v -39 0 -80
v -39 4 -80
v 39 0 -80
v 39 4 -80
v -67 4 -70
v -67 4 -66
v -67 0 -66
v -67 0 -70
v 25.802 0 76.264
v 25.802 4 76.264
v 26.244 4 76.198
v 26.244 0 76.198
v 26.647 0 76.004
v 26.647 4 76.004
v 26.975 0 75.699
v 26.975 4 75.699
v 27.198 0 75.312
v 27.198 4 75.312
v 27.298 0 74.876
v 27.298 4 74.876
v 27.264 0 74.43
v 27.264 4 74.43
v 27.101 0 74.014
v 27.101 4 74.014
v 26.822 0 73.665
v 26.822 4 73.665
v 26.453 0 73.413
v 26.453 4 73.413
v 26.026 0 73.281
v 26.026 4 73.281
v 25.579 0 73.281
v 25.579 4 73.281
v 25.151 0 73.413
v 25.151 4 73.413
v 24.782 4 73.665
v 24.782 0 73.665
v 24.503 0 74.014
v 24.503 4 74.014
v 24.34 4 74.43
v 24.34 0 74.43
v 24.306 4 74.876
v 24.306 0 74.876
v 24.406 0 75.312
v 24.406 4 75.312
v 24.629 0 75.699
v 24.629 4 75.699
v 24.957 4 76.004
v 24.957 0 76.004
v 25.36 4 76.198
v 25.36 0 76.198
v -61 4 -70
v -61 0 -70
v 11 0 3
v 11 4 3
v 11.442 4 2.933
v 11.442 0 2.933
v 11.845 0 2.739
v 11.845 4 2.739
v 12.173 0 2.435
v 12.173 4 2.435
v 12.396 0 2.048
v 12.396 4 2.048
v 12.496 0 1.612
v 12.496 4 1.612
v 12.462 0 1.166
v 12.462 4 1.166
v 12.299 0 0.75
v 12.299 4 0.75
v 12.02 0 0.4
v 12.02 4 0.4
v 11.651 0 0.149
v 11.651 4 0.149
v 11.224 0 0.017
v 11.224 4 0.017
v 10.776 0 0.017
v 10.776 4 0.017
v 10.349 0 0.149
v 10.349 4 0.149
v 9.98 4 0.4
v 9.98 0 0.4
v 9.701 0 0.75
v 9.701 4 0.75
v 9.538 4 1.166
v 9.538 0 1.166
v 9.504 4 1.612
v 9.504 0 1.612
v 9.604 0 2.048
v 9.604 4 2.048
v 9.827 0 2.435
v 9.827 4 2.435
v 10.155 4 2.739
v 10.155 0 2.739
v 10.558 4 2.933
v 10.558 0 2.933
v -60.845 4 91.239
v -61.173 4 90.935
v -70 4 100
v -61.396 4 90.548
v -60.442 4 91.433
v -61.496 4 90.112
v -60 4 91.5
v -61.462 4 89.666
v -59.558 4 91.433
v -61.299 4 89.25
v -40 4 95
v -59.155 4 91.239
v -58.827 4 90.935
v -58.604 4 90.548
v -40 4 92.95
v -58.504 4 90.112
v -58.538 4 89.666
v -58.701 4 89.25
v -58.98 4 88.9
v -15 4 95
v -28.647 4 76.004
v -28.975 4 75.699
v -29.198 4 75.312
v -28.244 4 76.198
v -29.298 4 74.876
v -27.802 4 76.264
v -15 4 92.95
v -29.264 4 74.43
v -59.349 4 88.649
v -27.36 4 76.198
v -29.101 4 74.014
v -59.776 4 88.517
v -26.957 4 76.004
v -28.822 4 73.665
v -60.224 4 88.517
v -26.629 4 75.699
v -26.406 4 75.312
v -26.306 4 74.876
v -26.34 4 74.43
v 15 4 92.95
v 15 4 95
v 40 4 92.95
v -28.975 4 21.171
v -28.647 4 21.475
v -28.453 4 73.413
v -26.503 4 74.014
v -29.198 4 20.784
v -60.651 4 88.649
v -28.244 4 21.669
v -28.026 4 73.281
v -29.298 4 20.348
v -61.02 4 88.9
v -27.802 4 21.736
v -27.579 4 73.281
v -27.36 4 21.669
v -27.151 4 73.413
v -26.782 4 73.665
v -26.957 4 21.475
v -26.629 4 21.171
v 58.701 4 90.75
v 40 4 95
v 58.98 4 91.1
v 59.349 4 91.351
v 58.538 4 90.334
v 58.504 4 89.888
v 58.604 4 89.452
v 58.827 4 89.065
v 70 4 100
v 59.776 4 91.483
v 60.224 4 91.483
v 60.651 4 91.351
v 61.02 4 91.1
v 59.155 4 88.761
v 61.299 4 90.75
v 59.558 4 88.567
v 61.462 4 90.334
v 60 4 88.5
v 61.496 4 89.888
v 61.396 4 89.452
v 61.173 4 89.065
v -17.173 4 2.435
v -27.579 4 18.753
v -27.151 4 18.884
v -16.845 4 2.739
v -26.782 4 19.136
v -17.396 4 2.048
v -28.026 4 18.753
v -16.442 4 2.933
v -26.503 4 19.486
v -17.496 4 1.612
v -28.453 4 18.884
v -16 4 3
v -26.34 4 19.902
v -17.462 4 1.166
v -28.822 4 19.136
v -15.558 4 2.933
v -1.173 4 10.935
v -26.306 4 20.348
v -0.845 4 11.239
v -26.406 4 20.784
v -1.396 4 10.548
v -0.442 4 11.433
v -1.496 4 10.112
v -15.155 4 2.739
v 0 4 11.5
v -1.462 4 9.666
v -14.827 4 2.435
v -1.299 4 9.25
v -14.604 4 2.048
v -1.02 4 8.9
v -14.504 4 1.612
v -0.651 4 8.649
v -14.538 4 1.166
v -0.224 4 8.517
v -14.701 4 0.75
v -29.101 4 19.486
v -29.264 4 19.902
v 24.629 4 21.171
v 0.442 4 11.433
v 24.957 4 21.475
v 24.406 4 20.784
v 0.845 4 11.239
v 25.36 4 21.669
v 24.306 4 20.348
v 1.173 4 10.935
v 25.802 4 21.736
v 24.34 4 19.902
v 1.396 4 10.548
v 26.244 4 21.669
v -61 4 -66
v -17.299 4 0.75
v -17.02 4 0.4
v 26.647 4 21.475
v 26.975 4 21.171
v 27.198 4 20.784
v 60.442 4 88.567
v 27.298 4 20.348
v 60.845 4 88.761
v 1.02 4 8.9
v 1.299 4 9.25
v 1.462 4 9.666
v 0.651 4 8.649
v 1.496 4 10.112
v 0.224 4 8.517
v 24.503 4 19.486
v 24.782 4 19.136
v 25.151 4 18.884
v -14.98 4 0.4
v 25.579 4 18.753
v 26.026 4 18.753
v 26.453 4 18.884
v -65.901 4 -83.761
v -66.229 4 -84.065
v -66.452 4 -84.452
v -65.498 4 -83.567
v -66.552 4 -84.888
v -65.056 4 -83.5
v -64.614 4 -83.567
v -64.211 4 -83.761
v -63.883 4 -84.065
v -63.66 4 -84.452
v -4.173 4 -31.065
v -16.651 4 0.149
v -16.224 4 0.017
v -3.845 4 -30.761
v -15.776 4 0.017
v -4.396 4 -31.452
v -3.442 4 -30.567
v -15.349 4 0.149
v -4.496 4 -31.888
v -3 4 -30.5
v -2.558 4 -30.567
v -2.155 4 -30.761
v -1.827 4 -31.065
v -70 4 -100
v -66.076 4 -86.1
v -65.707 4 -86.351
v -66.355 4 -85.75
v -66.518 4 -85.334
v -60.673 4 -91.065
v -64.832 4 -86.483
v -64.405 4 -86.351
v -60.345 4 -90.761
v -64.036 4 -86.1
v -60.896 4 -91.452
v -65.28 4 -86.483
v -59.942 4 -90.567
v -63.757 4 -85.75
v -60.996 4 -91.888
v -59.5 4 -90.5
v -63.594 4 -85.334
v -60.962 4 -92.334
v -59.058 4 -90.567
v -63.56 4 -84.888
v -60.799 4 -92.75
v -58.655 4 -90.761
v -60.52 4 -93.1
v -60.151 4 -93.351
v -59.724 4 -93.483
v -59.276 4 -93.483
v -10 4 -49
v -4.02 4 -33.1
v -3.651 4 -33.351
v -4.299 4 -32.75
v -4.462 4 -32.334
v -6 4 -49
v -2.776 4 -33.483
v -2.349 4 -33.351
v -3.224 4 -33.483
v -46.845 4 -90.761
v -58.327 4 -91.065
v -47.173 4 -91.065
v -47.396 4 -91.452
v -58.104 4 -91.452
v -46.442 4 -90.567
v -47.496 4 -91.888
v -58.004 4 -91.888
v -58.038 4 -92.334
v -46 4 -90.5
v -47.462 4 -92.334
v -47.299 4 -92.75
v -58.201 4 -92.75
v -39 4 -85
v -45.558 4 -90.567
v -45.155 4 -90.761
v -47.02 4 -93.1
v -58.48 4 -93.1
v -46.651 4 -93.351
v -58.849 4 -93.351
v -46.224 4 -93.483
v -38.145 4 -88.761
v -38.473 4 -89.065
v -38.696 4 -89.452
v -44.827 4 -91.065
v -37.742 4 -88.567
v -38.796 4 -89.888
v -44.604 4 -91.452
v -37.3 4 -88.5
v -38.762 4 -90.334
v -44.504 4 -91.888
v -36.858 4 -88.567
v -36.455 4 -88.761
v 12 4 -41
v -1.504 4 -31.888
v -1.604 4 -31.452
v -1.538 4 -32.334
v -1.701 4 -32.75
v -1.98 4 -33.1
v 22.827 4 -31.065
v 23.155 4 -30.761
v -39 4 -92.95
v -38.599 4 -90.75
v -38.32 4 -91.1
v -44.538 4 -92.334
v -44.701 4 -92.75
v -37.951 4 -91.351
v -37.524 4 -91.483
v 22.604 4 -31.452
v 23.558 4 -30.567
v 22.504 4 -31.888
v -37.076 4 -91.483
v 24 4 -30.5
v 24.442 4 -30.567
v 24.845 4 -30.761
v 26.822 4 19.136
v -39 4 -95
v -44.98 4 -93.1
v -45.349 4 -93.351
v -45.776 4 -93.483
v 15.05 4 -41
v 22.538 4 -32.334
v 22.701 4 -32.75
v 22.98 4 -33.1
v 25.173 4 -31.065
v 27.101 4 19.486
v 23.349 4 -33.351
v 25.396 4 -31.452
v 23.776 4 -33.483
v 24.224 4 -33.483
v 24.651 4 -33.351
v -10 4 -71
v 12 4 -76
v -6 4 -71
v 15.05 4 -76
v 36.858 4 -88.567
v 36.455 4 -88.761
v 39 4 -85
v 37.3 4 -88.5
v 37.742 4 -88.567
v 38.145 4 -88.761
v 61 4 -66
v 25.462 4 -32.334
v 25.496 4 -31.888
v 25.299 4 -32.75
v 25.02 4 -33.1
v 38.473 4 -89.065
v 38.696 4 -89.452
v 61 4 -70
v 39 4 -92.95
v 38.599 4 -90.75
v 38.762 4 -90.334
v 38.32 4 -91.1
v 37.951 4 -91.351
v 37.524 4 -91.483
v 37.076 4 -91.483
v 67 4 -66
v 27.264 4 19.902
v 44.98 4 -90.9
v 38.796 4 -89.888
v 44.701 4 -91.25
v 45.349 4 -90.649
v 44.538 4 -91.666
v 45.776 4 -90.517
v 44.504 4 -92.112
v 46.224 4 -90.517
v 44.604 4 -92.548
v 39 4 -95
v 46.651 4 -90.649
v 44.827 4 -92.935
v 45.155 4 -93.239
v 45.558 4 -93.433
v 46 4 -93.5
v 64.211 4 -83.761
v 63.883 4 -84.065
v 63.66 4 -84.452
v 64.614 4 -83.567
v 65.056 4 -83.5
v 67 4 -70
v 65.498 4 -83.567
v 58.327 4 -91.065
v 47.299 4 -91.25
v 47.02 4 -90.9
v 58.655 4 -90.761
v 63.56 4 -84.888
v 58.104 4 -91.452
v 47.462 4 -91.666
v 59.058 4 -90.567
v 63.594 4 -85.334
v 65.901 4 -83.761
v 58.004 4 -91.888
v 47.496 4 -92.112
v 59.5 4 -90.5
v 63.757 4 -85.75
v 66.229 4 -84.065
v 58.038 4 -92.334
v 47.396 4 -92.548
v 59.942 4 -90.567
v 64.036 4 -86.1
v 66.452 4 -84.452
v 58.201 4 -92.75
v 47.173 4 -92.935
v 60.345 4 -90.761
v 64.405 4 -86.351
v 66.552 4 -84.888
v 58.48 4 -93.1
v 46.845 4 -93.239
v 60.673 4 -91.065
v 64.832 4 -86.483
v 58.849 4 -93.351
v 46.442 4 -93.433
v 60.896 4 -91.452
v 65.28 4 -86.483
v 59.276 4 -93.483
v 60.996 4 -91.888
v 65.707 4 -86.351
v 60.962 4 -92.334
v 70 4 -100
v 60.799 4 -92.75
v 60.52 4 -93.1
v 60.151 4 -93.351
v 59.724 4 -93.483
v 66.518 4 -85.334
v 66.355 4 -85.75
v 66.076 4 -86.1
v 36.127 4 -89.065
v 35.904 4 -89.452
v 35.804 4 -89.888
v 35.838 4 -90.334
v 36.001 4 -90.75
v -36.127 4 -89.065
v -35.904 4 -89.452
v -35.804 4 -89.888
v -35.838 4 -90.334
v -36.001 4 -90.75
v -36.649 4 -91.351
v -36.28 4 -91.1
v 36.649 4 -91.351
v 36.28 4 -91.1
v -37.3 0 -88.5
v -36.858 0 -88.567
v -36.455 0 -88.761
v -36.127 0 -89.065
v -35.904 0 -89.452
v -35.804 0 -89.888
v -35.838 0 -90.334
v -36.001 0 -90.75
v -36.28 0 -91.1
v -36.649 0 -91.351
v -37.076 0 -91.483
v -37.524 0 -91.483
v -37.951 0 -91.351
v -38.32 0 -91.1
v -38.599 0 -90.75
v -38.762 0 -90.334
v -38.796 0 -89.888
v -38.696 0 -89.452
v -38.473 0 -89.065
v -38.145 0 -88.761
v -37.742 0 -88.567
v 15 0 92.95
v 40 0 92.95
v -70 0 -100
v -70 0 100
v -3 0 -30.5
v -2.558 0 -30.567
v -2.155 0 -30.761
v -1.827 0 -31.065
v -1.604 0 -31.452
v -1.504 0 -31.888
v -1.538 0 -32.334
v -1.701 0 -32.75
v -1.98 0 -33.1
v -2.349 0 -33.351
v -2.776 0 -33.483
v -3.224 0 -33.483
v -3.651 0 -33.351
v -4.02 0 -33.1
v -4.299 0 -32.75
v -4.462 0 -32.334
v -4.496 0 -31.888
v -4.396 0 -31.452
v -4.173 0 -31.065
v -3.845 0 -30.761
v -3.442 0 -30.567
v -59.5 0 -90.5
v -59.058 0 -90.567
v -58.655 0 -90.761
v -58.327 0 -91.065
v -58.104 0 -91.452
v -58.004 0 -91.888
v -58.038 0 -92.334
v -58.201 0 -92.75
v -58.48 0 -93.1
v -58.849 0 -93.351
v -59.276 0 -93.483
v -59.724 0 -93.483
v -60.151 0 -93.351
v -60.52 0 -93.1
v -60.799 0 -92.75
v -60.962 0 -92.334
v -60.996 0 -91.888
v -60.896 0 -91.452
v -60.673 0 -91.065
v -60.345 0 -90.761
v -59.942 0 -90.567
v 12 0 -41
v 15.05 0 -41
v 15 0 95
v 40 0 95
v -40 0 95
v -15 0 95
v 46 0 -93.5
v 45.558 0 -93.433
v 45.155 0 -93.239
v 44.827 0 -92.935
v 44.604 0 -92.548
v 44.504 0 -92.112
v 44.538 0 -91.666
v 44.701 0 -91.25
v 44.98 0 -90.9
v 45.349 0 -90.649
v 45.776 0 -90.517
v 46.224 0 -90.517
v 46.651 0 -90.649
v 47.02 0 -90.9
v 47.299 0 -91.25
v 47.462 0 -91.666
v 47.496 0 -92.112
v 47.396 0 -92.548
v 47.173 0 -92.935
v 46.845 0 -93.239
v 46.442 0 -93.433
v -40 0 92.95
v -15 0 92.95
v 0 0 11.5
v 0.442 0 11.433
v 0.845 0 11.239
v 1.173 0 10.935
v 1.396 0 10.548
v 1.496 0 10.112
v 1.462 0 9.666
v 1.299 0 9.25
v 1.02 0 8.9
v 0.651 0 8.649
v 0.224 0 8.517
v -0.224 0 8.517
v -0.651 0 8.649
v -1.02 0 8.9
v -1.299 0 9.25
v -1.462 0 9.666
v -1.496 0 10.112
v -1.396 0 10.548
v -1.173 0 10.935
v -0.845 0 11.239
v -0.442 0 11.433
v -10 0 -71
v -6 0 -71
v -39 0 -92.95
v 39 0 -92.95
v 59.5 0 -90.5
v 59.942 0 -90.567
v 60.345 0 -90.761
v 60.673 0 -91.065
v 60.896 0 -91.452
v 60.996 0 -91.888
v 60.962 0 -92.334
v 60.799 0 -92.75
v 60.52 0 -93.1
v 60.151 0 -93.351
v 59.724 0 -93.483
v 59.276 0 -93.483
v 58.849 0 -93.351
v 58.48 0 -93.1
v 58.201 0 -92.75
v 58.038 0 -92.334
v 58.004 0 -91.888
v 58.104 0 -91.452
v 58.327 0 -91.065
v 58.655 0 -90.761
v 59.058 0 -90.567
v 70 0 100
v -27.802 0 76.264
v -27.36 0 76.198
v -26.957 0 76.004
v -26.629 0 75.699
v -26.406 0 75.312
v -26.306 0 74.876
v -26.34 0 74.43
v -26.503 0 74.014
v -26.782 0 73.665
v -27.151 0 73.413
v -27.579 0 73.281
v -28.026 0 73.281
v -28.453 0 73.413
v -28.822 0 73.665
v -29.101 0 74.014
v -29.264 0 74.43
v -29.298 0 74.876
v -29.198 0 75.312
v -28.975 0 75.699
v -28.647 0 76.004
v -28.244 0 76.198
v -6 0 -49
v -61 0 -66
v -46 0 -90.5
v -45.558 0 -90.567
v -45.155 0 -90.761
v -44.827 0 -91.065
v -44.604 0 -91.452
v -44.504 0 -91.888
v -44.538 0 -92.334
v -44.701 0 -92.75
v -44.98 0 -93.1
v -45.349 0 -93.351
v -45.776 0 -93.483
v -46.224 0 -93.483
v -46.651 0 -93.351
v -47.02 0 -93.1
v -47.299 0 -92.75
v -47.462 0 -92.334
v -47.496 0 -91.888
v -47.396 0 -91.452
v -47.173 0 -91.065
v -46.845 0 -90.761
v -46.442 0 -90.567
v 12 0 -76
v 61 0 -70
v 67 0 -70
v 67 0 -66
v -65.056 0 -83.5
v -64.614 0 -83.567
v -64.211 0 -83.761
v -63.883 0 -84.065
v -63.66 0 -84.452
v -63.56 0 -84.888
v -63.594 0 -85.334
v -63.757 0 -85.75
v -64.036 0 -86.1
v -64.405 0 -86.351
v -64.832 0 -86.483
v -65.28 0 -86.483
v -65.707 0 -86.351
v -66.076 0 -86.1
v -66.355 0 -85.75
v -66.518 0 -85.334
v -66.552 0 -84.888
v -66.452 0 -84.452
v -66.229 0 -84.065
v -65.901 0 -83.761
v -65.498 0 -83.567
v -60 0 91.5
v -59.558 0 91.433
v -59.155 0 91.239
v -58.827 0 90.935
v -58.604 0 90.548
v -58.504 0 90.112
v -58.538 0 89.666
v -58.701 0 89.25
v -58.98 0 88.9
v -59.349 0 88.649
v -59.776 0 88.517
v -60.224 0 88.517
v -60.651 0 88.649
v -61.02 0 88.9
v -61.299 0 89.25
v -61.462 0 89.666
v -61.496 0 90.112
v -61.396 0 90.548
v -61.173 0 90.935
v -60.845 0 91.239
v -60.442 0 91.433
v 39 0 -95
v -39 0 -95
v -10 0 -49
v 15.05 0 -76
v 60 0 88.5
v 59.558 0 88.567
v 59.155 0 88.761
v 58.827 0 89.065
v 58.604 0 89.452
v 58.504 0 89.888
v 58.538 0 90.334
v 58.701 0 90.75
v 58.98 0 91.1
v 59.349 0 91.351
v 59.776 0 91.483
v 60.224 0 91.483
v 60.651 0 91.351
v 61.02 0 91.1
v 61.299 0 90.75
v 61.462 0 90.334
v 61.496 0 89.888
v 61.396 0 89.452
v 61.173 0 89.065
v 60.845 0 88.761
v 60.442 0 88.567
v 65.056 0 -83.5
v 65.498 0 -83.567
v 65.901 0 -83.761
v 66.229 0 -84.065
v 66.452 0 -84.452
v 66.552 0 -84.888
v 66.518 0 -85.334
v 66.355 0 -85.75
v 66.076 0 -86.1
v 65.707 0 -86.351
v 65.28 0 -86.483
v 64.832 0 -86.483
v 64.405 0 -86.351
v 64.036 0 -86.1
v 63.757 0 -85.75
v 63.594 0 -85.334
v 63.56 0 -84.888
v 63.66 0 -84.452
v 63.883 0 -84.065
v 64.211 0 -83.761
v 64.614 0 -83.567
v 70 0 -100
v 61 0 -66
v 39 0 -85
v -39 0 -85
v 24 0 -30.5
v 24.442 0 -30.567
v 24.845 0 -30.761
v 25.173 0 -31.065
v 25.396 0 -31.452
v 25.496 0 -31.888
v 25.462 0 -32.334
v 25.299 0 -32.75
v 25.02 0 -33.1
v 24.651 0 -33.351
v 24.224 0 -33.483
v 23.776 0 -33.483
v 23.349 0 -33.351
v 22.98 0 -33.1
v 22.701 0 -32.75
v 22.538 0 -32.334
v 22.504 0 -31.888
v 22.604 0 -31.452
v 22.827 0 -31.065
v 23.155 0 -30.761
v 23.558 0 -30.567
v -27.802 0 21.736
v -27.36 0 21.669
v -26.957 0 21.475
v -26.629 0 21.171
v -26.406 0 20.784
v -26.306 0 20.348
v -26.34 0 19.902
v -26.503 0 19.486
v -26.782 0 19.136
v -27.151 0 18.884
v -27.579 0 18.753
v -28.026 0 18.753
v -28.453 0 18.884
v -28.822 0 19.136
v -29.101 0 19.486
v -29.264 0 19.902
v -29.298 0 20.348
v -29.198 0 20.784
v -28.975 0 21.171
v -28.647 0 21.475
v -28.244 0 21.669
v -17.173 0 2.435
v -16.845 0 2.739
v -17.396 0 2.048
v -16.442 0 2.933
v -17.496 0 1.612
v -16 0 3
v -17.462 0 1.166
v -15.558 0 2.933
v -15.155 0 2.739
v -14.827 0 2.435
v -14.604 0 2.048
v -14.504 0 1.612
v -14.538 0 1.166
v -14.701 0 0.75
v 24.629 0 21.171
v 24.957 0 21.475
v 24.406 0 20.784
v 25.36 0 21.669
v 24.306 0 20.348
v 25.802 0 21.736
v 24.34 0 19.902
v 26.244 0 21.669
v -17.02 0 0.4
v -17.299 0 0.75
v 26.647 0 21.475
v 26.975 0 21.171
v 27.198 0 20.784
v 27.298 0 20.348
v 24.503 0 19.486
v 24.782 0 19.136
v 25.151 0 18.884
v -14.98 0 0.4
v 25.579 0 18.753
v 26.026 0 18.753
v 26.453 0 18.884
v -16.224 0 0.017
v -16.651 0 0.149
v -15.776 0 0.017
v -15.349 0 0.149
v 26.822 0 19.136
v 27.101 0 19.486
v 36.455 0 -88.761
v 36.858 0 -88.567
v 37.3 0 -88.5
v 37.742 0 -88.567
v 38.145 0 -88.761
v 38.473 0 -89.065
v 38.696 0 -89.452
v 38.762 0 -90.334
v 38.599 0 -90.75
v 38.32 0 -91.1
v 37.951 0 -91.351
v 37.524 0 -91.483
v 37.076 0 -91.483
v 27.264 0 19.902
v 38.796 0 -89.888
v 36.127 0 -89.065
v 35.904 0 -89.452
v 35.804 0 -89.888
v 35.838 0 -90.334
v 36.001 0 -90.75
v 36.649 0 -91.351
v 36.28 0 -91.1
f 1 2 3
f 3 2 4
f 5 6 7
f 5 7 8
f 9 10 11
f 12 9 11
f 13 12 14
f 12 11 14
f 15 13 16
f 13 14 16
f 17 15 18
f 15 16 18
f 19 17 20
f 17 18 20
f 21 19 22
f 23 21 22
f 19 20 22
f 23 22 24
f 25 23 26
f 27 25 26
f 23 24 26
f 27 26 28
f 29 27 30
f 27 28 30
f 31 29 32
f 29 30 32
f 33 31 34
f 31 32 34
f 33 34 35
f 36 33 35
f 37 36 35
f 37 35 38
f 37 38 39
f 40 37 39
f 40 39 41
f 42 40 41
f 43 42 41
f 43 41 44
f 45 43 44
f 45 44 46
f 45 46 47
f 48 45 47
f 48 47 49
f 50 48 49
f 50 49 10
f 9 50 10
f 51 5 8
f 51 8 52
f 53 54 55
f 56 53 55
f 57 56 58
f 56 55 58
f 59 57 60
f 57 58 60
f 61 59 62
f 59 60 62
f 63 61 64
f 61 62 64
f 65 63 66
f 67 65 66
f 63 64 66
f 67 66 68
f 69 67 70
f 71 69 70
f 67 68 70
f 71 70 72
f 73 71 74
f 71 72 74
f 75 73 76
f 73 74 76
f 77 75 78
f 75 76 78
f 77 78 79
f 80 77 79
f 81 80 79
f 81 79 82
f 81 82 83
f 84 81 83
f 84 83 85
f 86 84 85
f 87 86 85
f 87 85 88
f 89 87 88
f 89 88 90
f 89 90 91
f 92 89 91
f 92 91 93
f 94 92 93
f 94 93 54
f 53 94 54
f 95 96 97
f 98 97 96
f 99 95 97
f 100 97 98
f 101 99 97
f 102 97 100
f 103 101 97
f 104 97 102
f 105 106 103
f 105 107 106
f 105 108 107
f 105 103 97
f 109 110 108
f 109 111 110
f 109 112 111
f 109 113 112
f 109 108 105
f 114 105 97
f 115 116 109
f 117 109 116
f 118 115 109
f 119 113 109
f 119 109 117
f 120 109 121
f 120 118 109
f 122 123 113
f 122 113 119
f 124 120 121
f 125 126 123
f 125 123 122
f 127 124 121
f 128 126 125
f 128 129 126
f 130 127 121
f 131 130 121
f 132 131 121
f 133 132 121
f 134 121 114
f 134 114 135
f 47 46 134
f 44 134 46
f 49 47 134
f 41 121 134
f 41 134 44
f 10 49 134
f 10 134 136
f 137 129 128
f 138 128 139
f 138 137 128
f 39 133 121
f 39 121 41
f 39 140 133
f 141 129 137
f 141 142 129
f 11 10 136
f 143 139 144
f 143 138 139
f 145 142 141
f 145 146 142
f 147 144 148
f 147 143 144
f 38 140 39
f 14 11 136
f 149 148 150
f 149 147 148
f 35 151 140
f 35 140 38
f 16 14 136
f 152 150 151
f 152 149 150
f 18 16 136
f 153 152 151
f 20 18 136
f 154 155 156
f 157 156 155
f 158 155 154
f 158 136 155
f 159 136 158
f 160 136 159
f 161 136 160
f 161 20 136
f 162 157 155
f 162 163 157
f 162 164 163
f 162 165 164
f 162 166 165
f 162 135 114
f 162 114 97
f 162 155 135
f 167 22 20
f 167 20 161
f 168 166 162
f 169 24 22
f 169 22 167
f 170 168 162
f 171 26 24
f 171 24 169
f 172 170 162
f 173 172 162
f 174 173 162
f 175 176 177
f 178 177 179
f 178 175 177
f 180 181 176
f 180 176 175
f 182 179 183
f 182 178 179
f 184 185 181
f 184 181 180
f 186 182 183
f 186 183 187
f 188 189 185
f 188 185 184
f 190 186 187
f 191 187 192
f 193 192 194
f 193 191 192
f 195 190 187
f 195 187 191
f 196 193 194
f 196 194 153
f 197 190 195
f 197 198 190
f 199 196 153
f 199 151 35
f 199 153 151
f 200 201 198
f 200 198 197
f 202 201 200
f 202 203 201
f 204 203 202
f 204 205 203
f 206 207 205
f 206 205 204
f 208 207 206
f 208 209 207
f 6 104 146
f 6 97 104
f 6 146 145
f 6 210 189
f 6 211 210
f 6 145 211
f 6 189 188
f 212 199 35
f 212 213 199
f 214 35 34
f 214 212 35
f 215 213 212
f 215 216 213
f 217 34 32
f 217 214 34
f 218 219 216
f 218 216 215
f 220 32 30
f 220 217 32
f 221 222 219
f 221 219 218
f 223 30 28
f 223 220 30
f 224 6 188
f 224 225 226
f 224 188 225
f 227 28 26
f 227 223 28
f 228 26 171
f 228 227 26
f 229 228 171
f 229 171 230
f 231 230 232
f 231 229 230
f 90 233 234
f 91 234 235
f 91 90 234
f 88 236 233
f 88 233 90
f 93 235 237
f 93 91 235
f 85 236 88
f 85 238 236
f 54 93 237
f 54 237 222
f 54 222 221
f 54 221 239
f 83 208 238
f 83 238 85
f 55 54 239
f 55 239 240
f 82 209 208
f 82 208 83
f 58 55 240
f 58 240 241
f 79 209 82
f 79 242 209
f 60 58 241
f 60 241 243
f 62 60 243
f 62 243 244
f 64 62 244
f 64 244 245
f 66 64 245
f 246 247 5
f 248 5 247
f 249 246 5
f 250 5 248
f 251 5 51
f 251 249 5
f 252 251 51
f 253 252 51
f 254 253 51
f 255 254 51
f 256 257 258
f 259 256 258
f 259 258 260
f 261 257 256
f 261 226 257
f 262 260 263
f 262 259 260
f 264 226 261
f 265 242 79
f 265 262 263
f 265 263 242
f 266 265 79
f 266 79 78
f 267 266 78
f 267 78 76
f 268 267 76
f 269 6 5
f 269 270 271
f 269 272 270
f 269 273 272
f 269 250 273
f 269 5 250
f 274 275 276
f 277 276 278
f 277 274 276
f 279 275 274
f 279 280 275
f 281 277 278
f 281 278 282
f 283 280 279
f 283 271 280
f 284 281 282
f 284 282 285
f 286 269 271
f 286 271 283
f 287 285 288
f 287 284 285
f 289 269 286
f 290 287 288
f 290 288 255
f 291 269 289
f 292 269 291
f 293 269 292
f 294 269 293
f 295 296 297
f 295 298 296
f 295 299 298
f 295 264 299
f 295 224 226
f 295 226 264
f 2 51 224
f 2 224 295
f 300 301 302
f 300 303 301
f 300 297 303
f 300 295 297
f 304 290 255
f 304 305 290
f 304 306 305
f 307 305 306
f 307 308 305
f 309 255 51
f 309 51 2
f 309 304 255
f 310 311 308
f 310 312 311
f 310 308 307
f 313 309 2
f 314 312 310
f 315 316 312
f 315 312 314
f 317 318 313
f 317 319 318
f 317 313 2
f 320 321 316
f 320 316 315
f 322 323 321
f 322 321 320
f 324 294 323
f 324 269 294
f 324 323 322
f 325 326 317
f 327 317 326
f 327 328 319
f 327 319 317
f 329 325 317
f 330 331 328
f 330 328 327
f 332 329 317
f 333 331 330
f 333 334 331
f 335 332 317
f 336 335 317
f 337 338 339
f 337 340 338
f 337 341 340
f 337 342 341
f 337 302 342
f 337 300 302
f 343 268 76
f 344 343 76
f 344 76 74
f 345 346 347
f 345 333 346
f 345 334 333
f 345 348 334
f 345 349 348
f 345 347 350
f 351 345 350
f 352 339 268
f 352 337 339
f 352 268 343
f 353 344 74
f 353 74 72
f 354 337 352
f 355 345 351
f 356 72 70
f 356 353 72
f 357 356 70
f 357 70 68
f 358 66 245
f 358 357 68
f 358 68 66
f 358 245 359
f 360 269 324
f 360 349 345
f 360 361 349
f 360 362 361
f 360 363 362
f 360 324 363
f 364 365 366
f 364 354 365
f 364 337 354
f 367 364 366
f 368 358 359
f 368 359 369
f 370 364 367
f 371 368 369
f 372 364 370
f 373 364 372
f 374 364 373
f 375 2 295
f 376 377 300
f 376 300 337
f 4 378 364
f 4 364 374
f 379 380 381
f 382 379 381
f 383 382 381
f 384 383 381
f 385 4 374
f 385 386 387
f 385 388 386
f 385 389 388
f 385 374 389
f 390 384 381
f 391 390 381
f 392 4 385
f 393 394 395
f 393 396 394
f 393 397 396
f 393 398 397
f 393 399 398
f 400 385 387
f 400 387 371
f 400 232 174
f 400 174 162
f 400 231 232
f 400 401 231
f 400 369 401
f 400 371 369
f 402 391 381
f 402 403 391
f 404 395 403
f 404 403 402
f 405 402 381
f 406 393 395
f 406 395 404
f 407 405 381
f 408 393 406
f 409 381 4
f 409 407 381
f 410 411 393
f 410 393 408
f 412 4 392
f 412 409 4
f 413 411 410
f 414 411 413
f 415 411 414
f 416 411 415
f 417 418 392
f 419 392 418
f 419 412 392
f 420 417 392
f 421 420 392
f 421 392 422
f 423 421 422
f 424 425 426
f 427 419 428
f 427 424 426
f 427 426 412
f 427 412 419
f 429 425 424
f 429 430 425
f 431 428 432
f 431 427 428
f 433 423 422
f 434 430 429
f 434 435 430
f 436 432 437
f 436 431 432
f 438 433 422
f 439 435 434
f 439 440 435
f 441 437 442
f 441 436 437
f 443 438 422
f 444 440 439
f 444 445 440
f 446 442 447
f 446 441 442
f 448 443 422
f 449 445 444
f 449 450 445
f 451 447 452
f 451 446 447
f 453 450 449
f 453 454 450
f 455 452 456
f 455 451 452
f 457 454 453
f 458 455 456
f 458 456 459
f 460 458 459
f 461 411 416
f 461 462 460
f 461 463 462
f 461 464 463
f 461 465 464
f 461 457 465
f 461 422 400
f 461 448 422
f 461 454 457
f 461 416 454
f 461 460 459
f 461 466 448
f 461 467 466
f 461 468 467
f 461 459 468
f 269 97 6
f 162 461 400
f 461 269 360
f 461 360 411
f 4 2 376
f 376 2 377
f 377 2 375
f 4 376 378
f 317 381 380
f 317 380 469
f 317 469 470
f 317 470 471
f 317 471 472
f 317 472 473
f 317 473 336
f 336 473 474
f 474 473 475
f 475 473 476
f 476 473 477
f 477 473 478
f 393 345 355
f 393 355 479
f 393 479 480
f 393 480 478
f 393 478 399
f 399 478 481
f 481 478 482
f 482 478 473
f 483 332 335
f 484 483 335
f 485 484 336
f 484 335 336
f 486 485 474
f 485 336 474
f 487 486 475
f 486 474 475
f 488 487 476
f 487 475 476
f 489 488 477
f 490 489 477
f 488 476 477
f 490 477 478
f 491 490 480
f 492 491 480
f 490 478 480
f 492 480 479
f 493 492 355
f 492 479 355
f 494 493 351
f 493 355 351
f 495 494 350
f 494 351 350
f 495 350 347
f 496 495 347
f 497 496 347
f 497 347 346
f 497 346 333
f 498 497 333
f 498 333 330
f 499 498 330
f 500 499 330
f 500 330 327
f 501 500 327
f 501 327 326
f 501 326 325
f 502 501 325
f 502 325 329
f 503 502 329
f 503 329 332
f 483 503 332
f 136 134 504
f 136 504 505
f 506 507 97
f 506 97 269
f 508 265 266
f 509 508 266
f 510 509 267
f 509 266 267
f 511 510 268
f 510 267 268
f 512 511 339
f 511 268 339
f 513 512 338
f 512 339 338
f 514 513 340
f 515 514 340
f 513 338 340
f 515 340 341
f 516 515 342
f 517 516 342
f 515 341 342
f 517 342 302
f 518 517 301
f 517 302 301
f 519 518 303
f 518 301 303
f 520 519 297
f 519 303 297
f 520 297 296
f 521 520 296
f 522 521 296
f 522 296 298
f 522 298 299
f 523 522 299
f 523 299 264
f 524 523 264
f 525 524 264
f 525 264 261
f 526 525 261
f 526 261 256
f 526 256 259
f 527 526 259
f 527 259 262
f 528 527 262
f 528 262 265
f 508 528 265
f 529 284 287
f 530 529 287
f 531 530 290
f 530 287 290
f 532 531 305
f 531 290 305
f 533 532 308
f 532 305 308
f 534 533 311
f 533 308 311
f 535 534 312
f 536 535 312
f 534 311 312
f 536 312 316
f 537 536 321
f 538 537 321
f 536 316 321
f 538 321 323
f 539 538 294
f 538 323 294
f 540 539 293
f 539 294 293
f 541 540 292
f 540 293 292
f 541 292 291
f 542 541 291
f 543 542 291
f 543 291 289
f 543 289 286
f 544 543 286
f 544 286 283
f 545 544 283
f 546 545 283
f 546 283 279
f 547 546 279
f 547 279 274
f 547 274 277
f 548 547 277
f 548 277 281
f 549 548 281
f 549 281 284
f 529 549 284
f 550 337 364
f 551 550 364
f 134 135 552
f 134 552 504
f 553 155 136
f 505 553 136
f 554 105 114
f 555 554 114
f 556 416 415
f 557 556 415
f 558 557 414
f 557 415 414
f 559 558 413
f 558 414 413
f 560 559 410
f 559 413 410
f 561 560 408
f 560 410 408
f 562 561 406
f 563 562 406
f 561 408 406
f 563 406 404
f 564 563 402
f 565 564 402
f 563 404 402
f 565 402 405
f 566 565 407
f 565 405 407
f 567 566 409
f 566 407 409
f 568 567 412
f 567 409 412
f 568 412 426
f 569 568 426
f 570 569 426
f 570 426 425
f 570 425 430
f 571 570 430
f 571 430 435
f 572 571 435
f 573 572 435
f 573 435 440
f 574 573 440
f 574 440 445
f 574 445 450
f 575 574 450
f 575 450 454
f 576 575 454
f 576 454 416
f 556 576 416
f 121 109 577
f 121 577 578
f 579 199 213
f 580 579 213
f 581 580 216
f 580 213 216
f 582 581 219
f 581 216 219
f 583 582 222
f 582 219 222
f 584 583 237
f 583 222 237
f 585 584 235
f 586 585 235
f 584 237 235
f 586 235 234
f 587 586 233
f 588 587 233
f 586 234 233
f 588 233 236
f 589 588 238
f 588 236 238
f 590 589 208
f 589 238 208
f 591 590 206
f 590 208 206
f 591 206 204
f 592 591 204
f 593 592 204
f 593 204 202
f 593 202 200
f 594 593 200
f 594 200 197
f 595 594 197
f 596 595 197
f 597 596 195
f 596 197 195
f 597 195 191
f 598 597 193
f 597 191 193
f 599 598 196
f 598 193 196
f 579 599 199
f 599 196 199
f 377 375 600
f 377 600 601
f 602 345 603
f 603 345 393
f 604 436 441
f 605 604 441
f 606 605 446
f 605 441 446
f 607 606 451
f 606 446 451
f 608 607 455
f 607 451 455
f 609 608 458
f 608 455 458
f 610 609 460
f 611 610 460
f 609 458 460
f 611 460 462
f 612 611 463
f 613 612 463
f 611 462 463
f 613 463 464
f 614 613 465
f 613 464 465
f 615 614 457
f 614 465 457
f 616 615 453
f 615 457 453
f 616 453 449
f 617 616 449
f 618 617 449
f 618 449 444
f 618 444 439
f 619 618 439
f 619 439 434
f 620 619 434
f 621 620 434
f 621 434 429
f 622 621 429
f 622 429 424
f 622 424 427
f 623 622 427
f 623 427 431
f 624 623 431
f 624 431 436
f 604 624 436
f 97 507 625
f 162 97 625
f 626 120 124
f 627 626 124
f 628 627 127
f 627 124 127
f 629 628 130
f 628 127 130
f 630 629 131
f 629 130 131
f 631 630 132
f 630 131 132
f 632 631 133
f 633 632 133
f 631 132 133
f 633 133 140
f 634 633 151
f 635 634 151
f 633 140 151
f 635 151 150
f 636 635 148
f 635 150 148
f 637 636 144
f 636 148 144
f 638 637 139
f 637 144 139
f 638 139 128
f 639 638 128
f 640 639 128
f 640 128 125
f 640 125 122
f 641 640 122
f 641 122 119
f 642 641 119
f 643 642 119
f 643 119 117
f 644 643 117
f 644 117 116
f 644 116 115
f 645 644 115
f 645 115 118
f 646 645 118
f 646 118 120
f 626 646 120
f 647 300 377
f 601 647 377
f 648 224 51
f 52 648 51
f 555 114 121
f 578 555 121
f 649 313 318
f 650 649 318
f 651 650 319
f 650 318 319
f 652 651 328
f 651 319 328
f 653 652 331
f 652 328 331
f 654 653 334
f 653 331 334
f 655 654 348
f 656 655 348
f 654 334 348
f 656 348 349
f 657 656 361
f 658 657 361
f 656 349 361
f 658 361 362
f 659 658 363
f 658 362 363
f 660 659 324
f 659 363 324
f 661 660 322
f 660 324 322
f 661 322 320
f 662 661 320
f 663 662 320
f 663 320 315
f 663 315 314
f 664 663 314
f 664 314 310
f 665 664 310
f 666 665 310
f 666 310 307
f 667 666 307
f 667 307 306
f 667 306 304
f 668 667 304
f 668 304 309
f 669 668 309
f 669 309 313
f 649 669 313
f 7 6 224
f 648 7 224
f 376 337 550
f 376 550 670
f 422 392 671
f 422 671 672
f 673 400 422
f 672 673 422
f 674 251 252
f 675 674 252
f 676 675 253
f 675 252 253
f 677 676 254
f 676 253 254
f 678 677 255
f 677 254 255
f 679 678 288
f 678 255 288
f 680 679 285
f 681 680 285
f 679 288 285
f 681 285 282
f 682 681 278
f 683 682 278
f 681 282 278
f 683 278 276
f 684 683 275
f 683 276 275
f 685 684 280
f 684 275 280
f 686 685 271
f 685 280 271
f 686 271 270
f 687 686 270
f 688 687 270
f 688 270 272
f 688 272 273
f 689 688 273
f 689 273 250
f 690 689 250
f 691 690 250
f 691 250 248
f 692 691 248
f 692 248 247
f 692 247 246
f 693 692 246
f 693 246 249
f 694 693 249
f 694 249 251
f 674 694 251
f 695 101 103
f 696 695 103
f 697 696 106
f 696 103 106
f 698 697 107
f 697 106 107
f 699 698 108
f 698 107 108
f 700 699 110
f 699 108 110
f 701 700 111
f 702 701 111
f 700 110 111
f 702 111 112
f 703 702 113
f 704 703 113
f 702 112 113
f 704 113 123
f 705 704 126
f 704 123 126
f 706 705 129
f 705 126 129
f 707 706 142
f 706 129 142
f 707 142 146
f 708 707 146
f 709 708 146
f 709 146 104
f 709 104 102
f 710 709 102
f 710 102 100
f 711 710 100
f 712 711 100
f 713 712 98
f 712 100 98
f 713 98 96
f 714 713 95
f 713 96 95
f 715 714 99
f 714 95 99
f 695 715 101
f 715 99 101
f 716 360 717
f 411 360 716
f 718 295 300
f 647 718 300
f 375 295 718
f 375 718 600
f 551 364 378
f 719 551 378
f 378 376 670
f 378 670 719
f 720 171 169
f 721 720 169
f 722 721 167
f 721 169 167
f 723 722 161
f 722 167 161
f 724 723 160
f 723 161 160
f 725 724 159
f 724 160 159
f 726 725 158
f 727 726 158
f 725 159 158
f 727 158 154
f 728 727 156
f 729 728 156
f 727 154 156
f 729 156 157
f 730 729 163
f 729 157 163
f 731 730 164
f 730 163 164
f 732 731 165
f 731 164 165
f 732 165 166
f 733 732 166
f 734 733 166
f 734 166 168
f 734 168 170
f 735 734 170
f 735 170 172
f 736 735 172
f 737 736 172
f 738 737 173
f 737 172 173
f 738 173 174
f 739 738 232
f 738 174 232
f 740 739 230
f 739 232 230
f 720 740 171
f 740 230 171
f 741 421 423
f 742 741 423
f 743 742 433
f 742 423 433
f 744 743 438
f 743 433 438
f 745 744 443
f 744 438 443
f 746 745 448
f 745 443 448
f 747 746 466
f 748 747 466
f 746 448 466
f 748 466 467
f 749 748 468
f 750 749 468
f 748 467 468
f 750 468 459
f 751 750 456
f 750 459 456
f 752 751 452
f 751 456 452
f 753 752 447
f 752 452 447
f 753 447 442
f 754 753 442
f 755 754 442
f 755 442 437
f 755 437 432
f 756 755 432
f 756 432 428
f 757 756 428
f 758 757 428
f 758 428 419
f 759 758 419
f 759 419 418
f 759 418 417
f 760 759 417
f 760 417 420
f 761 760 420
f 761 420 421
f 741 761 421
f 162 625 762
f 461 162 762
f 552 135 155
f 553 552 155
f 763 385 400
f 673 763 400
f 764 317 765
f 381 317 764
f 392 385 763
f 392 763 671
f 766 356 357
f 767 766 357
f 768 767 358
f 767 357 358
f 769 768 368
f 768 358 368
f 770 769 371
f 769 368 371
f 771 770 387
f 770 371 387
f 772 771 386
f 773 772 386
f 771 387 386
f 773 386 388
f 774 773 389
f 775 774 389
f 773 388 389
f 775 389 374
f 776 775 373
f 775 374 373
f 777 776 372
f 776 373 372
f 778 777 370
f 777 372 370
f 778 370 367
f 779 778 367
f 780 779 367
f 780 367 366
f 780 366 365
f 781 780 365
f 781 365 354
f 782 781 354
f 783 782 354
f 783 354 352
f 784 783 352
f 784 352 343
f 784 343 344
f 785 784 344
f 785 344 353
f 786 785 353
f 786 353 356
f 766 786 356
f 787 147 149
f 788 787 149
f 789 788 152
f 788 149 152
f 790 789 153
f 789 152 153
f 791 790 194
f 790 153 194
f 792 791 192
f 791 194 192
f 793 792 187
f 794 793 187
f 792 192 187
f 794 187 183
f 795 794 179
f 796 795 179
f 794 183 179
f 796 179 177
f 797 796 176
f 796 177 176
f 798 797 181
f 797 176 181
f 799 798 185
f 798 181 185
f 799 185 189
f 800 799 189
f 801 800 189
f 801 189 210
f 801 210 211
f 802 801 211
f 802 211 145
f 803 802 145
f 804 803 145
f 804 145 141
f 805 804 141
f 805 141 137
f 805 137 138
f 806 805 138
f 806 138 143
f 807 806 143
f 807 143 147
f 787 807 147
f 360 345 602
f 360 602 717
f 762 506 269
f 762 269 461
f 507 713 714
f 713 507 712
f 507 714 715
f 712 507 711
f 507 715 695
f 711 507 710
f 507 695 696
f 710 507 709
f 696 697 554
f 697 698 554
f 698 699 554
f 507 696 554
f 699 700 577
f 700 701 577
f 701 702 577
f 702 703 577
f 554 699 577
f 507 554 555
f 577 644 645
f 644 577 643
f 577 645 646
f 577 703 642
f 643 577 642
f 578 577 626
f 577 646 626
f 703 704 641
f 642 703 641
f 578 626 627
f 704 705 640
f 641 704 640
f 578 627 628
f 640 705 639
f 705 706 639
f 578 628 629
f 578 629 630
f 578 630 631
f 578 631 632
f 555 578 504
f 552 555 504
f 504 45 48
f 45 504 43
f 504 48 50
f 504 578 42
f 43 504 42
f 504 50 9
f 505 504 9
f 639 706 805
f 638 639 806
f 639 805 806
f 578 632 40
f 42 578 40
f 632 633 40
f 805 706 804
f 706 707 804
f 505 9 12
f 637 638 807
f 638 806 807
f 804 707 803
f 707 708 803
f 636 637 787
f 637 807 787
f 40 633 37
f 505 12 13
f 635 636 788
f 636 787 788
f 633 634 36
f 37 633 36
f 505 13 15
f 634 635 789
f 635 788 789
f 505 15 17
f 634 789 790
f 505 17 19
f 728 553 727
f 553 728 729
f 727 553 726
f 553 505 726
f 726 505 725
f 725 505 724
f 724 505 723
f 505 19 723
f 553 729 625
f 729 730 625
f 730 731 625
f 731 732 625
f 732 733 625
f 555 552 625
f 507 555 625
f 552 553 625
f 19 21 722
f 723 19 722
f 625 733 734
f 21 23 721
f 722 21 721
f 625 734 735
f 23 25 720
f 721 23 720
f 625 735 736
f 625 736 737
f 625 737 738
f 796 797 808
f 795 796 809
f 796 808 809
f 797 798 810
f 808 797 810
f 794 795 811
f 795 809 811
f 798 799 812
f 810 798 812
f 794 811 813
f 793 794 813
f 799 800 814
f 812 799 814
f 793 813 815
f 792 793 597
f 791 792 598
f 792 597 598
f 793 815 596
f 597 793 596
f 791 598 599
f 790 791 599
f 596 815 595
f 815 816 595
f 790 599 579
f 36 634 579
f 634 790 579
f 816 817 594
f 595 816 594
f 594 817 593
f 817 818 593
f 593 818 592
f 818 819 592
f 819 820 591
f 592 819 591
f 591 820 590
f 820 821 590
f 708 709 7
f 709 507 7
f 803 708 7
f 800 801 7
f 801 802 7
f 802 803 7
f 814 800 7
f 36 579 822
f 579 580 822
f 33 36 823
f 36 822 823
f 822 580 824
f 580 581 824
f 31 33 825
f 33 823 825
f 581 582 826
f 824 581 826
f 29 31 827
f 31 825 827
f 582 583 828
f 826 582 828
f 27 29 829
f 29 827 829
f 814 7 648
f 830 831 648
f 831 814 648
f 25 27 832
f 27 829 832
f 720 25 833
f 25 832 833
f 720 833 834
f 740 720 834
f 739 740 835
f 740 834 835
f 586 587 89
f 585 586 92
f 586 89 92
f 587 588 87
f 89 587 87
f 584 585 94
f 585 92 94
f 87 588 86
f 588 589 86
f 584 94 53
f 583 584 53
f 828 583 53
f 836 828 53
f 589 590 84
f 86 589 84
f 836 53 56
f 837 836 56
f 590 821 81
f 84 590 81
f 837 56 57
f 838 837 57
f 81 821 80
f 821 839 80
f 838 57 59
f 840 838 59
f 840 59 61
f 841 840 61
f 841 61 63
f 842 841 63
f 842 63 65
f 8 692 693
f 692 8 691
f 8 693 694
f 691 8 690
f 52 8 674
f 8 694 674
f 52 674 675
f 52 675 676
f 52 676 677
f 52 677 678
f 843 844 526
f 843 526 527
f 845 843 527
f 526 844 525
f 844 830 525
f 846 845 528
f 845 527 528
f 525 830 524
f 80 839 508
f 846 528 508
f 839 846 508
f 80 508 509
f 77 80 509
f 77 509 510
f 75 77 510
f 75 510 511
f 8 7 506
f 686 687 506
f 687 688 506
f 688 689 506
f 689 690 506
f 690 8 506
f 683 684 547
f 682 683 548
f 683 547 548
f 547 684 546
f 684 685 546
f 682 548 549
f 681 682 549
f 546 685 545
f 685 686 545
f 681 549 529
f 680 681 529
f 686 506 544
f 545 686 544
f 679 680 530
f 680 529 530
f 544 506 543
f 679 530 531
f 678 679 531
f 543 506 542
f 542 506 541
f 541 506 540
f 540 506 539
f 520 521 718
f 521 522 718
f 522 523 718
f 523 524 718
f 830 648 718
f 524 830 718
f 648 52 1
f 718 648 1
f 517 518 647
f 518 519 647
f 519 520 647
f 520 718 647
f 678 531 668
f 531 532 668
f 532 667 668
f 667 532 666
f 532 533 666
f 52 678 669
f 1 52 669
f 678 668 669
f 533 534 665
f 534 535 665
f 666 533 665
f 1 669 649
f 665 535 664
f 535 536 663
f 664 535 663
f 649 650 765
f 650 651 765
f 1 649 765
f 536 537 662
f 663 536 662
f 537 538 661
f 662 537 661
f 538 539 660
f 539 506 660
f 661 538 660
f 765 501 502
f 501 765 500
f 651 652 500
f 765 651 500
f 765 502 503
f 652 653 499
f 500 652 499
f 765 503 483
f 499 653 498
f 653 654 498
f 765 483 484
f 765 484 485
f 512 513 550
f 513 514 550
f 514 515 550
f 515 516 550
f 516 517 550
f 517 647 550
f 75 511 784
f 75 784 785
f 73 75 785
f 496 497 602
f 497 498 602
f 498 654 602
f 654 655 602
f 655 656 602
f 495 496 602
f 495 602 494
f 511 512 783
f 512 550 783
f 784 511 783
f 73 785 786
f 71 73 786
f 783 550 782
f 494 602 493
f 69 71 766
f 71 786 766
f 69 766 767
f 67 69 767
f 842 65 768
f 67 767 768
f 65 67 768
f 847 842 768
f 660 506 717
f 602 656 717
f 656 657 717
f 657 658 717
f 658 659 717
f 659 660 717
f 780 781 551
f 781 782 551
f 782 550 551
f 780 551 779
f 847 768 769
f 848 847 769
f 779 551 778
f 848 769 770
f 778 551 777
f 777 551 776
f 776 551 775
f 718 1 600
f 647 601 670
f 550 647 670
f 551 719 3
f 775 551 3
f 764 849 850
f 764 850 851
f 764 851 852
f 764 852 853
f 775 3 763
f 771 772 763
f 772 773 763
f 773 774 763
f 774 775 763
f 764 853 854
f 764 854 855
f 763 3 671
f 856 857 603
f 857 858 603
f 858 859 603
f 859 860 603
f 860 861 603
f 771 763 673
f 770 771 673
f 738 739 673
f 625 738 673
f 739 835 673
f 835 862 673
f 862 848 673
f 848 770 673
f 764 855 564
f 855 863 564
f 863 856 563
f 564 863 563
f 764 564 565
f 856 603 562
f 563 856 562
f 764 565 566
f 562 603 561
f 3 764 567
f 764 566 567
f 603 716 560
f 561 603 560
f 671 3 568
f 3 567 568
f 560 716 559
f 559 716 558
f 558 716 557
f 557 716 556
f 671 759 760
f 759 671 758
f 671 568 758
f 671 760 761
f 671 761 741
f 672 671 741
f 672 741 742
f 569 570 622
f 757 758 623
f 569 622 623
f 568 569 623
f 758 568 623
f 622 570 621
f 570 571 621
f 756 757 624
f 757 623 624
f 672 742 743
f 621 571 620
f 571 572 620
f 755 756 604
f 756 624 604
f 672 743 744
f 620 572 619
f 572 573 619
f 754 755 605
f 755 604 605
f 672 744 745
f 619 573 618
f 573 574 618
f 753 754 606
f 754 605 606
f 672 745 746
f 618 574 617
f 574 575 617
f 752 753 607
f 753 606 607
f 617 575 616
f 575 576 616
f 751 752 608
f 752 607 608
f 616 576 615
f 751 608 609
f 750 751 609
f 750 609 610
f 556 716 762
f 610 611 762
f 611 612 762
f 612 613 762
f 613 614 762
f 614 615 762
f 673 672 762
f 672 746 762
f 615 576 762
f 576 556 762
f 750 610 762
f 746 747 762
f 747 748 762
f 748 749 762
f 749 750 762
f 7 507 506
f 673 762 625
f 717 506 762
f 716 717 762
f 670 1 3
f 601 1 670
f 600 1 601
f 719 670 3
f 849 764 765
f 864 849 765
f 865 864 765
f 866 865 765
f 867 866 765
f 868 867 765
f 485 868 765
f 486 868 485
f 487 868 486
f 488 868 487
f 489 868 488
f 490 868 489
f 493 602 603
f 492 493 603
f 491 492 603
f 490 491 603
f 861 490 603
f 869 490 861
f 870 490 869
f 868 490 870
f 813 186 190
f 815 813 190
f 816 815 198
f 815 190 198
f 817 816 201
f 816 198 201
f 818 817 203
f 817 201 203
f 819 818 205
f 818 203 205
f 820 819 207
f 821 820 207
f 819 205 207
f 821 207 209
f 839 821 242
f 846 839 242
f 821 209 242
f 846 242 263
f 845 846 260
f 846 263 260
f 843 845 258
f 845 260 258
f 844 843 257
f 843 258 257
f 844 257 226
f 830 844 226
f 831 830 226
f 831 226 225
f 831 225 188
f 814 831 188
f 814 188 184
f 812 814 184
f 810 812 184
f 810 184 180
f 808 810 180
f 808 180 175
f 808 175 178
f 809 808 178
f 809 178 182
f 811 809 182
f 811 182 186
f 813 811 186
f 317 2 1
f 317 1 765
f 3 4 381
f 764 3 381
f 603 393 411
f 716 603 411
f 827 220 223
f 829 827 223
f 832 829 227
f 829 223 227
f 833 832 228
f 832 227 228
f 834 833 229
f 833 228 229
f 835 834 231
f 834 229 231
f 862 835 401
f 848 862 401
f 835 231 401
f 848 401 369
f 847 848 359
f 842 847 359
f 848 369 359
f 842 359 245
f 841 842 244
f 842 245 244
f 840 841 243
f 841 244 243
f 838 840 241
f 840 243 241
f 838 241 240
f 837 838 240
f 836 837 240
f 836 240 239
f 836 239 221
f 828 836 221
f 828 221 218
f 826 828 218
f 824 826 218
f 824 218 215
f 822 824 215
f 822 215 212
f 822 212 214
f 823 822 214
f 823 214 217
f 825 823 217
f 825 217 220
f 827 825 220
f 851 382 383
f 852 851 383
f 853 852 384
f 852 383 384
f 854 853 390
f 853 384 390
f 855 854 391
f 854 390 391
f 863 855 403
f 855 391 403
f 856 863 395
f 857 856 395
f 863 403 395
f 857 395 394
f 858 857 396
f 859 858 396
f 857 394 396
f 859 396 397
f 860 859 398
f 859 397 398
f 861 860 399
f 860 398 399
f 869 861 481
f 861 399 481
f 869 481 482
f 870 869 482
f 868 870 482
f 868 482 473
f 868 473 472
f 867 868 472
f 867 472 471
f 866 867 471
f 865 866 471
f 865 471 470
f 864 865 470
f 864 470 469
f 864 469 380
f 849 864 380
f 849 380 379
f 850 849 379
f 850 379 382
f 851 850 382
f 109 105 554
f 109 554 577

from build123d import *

# Parameters (mm, degrees)
SKETCH1_W           = 140
SKETCH1_H           = 200
BOSS_EXTRUDE1_DEPTH = 4
SKETCH2_W           = 78
SKETCH2_H           = 2.05
SKETCH2_R           = 1.5
SKETCH2_H_2         = 5
CUT_EXTRUDE3_DEPTH  = 123.131077126
SKETCH3_W           = 6
SKETCH3_H           = 4
SKETCH3_R           = 1.5
CUT_EXTRUDE5_DEPTH  = 123.131077126
SKETCH4_R           = 1.5
CUT_EXTRUDE6_DEPTH  = 123.131077126
SKETCH6_W           = 3.05
SKETCH6_H           = 35
SKETCH6_W_2         = 4
SKETCH6_H_2         = 22
CUT_EXTRUDE13_DEPTH = 4
SKETCH7_R           = 1.5
CUT_EXTRUDE15_DEPTH = 123.131077126
SKETCH8_R           = 1.5
SKETCH8_W           = 25
SKETCH8_H           = 2.05
CUT_EXTRUDE16_DEPTH = 4


with BuildPart() as part:
    # Sketch1 → Boss-Extrude1 (new body)
    with BuildSketch(Plane(origin=(0, 0, 0), x_dir=(1, 0, 0), z_dir=(0, 1, 0))):
        Rectangle(SKETCH1_W, SKETCH1_H)
    extrude(amount=BOSS_EXTRUDE1_DEPTH)

    # Sketch2 → Cut-Extrude3 (cut, through all)
    with BuildSketch(Plane(origin=(0, 4, 0), x_dir=(1, 0, 0), z_dir=(0, 1, 0))):
        with Locations((0, 93.975)):
            Rectangle(SKETCH2_W, SKETCH2_H)
        with Locations(Location((-37.3, 90, 0), (0, 0, 270))):
            Circle(SKETCH2_R)
        with Locations(Location((37.3, 90, 0), (0, 0, 270))):
            Circle(SKETCH2_R)
        with Locations((0, 82.5)):
            Rectangle(SKETCH2_W, SKETCH2_H_2)
    extrude(amount=-CUT_EXTRUDE3_DEPTH, mode=Mode.SUBTRACT)

    # Sketch3 → Cut-Extrude5 (cut, through all)
    with BuildSketch(Plane(origin=(0, 4, 0), x_dir=(1, 0, 0), z_dir=(0, 1, 0))):
        with Locations((-64, 68)):
            Rectangle(SKETCH3_W, SKETCH3_H)
        with Locations(Location((65.055984274, 85, 0), (0, 0, 270))):
            Circle(SKETCH3_R)
        with Locations((64, 68)):
            Rectangle(SKETCH3_W, SKETCH3_H)
        with Locations(Location((-65.055984274, 85, 0), (0, 0, 270))):
            Circle(SKETCH3_R)
    extrude(amount=-CUT_EXTRUDE5_DEPTH, mode=Mode.SUBTRACT)

    # Sketch4 → Cut-Extrude6 (cut, through all)
    with BuildSketch(Plane(origin=(0, 4, 0), x_dir=(1, 0, 0), z_dir=(0, 1, 0))):
        with Locations(Location((59.5, 92, 0), (0, 0, 270))):
            Circle(SKETCH4_R)
        with Locations(Location((-59.5, 92, 0), (0, 0, 270))):
            Circle(SKETCH4_R)
        with Locations(Location((-46, 92, 0), (0, 0, 270))):
            Circle(SKETCH4_R)
        with Locations(Location((46, 92, 0), (0, 0, 90))):
            Circle(SKETCH4_R)
    extrude(amount=-CUT_EXTRUDE6_DEPTH, mode=Mode.SUBTRACT)

    # Sketch6 → Cut-Extrude13 (cut)
    with BuildSketch(Plane(origin=(0, 4, 0), x_dir=(1, 0, 0), z_dir=(0, 1, 0))):
        with Locations((13.525, 58.5)):
            Rectangle(SKETCH6_W, SKETCH6_H)
        with Locations((-8, 60)):
            Rectangle(SKETCH6_W_2, SKETCH6_H_2)
    extrude(amount=-CUT_EXTRUDE13_DEPTH, mode=Mode.SUBTRACT)

    # Sketch7 → Cut-Extrude15 (cut, through all)
    with BuildSketch(Plane(origin=(0, 4, 0), x_dir=(1, 0, 0), z_dir=(0, 1, 0))):
        with Locations(Location((25.802064663, -20.235830774, 0), (0, 0, 270))):
            Circle(SKETCH7_R)
        with Locations(Location((-27.802064663, -74.764169226, 0), (0, 0, 270))):
            Circle(SKETCH7_R)
        with Locations(Location((25.802064663, -74.764169226, 0), (0, 0, 270))):
            Circle(SKETCH7_R)
        with Locations(Location((24, 32, 0), (0, 0, 270))):
            Circle(SKETCH7_R)
        with Locations(Location((11, -1.5, 0), (0, 0, 270))):
            Circle(SKETCH7_R)
        with Locations(Location((-16, -1.5, 0), (0, 0, 270))):
            Circle(SKETCH7_R)
        with Locations(Location((-3, 32, 0), (0, 0, 270))):
            Circle(SKETCH7_R)
        with Locations(Location((-27.802064663, -20.235830774, 0), (0, 0, 270))):
            Circle(SKETCH7_R)
    extrude(amount=-CUT_EXTRUDE15_DEPTH, mode=Mode.SUBTRACT)

    # Sketch8 → Cut-Extrude16 (cut)
    with BuildSketch(Plane(origin=(0, 4, 0), x_dir=(1, 0, 0), z_dir=(0, 1, 0))):
        with Locations(Location((0, -10, 0), (0, 0, 270))):
            Circle(SKETCH8_R)
        with Locations(Location((-60, -90, 0), (0, 0, 270))):
            Circle(SKETCH8_R)
        with Locations(Location((60, -90, 0), (0, 0, 90))):
            Circle(SKETCH8_R)
        with Locations((27.5, -93.975)):
            Rectangle(SKETCH8_W, SKETCH8_H)
        with Locations((-27.5, -93.975)):
            Rectangle(SKETCH8_W, SKETCH8_H)
    extrude(amount=-CUT_EXTRUDE16_DEPTH, mode=Mode.SUBTRACT)


solid = part.part
